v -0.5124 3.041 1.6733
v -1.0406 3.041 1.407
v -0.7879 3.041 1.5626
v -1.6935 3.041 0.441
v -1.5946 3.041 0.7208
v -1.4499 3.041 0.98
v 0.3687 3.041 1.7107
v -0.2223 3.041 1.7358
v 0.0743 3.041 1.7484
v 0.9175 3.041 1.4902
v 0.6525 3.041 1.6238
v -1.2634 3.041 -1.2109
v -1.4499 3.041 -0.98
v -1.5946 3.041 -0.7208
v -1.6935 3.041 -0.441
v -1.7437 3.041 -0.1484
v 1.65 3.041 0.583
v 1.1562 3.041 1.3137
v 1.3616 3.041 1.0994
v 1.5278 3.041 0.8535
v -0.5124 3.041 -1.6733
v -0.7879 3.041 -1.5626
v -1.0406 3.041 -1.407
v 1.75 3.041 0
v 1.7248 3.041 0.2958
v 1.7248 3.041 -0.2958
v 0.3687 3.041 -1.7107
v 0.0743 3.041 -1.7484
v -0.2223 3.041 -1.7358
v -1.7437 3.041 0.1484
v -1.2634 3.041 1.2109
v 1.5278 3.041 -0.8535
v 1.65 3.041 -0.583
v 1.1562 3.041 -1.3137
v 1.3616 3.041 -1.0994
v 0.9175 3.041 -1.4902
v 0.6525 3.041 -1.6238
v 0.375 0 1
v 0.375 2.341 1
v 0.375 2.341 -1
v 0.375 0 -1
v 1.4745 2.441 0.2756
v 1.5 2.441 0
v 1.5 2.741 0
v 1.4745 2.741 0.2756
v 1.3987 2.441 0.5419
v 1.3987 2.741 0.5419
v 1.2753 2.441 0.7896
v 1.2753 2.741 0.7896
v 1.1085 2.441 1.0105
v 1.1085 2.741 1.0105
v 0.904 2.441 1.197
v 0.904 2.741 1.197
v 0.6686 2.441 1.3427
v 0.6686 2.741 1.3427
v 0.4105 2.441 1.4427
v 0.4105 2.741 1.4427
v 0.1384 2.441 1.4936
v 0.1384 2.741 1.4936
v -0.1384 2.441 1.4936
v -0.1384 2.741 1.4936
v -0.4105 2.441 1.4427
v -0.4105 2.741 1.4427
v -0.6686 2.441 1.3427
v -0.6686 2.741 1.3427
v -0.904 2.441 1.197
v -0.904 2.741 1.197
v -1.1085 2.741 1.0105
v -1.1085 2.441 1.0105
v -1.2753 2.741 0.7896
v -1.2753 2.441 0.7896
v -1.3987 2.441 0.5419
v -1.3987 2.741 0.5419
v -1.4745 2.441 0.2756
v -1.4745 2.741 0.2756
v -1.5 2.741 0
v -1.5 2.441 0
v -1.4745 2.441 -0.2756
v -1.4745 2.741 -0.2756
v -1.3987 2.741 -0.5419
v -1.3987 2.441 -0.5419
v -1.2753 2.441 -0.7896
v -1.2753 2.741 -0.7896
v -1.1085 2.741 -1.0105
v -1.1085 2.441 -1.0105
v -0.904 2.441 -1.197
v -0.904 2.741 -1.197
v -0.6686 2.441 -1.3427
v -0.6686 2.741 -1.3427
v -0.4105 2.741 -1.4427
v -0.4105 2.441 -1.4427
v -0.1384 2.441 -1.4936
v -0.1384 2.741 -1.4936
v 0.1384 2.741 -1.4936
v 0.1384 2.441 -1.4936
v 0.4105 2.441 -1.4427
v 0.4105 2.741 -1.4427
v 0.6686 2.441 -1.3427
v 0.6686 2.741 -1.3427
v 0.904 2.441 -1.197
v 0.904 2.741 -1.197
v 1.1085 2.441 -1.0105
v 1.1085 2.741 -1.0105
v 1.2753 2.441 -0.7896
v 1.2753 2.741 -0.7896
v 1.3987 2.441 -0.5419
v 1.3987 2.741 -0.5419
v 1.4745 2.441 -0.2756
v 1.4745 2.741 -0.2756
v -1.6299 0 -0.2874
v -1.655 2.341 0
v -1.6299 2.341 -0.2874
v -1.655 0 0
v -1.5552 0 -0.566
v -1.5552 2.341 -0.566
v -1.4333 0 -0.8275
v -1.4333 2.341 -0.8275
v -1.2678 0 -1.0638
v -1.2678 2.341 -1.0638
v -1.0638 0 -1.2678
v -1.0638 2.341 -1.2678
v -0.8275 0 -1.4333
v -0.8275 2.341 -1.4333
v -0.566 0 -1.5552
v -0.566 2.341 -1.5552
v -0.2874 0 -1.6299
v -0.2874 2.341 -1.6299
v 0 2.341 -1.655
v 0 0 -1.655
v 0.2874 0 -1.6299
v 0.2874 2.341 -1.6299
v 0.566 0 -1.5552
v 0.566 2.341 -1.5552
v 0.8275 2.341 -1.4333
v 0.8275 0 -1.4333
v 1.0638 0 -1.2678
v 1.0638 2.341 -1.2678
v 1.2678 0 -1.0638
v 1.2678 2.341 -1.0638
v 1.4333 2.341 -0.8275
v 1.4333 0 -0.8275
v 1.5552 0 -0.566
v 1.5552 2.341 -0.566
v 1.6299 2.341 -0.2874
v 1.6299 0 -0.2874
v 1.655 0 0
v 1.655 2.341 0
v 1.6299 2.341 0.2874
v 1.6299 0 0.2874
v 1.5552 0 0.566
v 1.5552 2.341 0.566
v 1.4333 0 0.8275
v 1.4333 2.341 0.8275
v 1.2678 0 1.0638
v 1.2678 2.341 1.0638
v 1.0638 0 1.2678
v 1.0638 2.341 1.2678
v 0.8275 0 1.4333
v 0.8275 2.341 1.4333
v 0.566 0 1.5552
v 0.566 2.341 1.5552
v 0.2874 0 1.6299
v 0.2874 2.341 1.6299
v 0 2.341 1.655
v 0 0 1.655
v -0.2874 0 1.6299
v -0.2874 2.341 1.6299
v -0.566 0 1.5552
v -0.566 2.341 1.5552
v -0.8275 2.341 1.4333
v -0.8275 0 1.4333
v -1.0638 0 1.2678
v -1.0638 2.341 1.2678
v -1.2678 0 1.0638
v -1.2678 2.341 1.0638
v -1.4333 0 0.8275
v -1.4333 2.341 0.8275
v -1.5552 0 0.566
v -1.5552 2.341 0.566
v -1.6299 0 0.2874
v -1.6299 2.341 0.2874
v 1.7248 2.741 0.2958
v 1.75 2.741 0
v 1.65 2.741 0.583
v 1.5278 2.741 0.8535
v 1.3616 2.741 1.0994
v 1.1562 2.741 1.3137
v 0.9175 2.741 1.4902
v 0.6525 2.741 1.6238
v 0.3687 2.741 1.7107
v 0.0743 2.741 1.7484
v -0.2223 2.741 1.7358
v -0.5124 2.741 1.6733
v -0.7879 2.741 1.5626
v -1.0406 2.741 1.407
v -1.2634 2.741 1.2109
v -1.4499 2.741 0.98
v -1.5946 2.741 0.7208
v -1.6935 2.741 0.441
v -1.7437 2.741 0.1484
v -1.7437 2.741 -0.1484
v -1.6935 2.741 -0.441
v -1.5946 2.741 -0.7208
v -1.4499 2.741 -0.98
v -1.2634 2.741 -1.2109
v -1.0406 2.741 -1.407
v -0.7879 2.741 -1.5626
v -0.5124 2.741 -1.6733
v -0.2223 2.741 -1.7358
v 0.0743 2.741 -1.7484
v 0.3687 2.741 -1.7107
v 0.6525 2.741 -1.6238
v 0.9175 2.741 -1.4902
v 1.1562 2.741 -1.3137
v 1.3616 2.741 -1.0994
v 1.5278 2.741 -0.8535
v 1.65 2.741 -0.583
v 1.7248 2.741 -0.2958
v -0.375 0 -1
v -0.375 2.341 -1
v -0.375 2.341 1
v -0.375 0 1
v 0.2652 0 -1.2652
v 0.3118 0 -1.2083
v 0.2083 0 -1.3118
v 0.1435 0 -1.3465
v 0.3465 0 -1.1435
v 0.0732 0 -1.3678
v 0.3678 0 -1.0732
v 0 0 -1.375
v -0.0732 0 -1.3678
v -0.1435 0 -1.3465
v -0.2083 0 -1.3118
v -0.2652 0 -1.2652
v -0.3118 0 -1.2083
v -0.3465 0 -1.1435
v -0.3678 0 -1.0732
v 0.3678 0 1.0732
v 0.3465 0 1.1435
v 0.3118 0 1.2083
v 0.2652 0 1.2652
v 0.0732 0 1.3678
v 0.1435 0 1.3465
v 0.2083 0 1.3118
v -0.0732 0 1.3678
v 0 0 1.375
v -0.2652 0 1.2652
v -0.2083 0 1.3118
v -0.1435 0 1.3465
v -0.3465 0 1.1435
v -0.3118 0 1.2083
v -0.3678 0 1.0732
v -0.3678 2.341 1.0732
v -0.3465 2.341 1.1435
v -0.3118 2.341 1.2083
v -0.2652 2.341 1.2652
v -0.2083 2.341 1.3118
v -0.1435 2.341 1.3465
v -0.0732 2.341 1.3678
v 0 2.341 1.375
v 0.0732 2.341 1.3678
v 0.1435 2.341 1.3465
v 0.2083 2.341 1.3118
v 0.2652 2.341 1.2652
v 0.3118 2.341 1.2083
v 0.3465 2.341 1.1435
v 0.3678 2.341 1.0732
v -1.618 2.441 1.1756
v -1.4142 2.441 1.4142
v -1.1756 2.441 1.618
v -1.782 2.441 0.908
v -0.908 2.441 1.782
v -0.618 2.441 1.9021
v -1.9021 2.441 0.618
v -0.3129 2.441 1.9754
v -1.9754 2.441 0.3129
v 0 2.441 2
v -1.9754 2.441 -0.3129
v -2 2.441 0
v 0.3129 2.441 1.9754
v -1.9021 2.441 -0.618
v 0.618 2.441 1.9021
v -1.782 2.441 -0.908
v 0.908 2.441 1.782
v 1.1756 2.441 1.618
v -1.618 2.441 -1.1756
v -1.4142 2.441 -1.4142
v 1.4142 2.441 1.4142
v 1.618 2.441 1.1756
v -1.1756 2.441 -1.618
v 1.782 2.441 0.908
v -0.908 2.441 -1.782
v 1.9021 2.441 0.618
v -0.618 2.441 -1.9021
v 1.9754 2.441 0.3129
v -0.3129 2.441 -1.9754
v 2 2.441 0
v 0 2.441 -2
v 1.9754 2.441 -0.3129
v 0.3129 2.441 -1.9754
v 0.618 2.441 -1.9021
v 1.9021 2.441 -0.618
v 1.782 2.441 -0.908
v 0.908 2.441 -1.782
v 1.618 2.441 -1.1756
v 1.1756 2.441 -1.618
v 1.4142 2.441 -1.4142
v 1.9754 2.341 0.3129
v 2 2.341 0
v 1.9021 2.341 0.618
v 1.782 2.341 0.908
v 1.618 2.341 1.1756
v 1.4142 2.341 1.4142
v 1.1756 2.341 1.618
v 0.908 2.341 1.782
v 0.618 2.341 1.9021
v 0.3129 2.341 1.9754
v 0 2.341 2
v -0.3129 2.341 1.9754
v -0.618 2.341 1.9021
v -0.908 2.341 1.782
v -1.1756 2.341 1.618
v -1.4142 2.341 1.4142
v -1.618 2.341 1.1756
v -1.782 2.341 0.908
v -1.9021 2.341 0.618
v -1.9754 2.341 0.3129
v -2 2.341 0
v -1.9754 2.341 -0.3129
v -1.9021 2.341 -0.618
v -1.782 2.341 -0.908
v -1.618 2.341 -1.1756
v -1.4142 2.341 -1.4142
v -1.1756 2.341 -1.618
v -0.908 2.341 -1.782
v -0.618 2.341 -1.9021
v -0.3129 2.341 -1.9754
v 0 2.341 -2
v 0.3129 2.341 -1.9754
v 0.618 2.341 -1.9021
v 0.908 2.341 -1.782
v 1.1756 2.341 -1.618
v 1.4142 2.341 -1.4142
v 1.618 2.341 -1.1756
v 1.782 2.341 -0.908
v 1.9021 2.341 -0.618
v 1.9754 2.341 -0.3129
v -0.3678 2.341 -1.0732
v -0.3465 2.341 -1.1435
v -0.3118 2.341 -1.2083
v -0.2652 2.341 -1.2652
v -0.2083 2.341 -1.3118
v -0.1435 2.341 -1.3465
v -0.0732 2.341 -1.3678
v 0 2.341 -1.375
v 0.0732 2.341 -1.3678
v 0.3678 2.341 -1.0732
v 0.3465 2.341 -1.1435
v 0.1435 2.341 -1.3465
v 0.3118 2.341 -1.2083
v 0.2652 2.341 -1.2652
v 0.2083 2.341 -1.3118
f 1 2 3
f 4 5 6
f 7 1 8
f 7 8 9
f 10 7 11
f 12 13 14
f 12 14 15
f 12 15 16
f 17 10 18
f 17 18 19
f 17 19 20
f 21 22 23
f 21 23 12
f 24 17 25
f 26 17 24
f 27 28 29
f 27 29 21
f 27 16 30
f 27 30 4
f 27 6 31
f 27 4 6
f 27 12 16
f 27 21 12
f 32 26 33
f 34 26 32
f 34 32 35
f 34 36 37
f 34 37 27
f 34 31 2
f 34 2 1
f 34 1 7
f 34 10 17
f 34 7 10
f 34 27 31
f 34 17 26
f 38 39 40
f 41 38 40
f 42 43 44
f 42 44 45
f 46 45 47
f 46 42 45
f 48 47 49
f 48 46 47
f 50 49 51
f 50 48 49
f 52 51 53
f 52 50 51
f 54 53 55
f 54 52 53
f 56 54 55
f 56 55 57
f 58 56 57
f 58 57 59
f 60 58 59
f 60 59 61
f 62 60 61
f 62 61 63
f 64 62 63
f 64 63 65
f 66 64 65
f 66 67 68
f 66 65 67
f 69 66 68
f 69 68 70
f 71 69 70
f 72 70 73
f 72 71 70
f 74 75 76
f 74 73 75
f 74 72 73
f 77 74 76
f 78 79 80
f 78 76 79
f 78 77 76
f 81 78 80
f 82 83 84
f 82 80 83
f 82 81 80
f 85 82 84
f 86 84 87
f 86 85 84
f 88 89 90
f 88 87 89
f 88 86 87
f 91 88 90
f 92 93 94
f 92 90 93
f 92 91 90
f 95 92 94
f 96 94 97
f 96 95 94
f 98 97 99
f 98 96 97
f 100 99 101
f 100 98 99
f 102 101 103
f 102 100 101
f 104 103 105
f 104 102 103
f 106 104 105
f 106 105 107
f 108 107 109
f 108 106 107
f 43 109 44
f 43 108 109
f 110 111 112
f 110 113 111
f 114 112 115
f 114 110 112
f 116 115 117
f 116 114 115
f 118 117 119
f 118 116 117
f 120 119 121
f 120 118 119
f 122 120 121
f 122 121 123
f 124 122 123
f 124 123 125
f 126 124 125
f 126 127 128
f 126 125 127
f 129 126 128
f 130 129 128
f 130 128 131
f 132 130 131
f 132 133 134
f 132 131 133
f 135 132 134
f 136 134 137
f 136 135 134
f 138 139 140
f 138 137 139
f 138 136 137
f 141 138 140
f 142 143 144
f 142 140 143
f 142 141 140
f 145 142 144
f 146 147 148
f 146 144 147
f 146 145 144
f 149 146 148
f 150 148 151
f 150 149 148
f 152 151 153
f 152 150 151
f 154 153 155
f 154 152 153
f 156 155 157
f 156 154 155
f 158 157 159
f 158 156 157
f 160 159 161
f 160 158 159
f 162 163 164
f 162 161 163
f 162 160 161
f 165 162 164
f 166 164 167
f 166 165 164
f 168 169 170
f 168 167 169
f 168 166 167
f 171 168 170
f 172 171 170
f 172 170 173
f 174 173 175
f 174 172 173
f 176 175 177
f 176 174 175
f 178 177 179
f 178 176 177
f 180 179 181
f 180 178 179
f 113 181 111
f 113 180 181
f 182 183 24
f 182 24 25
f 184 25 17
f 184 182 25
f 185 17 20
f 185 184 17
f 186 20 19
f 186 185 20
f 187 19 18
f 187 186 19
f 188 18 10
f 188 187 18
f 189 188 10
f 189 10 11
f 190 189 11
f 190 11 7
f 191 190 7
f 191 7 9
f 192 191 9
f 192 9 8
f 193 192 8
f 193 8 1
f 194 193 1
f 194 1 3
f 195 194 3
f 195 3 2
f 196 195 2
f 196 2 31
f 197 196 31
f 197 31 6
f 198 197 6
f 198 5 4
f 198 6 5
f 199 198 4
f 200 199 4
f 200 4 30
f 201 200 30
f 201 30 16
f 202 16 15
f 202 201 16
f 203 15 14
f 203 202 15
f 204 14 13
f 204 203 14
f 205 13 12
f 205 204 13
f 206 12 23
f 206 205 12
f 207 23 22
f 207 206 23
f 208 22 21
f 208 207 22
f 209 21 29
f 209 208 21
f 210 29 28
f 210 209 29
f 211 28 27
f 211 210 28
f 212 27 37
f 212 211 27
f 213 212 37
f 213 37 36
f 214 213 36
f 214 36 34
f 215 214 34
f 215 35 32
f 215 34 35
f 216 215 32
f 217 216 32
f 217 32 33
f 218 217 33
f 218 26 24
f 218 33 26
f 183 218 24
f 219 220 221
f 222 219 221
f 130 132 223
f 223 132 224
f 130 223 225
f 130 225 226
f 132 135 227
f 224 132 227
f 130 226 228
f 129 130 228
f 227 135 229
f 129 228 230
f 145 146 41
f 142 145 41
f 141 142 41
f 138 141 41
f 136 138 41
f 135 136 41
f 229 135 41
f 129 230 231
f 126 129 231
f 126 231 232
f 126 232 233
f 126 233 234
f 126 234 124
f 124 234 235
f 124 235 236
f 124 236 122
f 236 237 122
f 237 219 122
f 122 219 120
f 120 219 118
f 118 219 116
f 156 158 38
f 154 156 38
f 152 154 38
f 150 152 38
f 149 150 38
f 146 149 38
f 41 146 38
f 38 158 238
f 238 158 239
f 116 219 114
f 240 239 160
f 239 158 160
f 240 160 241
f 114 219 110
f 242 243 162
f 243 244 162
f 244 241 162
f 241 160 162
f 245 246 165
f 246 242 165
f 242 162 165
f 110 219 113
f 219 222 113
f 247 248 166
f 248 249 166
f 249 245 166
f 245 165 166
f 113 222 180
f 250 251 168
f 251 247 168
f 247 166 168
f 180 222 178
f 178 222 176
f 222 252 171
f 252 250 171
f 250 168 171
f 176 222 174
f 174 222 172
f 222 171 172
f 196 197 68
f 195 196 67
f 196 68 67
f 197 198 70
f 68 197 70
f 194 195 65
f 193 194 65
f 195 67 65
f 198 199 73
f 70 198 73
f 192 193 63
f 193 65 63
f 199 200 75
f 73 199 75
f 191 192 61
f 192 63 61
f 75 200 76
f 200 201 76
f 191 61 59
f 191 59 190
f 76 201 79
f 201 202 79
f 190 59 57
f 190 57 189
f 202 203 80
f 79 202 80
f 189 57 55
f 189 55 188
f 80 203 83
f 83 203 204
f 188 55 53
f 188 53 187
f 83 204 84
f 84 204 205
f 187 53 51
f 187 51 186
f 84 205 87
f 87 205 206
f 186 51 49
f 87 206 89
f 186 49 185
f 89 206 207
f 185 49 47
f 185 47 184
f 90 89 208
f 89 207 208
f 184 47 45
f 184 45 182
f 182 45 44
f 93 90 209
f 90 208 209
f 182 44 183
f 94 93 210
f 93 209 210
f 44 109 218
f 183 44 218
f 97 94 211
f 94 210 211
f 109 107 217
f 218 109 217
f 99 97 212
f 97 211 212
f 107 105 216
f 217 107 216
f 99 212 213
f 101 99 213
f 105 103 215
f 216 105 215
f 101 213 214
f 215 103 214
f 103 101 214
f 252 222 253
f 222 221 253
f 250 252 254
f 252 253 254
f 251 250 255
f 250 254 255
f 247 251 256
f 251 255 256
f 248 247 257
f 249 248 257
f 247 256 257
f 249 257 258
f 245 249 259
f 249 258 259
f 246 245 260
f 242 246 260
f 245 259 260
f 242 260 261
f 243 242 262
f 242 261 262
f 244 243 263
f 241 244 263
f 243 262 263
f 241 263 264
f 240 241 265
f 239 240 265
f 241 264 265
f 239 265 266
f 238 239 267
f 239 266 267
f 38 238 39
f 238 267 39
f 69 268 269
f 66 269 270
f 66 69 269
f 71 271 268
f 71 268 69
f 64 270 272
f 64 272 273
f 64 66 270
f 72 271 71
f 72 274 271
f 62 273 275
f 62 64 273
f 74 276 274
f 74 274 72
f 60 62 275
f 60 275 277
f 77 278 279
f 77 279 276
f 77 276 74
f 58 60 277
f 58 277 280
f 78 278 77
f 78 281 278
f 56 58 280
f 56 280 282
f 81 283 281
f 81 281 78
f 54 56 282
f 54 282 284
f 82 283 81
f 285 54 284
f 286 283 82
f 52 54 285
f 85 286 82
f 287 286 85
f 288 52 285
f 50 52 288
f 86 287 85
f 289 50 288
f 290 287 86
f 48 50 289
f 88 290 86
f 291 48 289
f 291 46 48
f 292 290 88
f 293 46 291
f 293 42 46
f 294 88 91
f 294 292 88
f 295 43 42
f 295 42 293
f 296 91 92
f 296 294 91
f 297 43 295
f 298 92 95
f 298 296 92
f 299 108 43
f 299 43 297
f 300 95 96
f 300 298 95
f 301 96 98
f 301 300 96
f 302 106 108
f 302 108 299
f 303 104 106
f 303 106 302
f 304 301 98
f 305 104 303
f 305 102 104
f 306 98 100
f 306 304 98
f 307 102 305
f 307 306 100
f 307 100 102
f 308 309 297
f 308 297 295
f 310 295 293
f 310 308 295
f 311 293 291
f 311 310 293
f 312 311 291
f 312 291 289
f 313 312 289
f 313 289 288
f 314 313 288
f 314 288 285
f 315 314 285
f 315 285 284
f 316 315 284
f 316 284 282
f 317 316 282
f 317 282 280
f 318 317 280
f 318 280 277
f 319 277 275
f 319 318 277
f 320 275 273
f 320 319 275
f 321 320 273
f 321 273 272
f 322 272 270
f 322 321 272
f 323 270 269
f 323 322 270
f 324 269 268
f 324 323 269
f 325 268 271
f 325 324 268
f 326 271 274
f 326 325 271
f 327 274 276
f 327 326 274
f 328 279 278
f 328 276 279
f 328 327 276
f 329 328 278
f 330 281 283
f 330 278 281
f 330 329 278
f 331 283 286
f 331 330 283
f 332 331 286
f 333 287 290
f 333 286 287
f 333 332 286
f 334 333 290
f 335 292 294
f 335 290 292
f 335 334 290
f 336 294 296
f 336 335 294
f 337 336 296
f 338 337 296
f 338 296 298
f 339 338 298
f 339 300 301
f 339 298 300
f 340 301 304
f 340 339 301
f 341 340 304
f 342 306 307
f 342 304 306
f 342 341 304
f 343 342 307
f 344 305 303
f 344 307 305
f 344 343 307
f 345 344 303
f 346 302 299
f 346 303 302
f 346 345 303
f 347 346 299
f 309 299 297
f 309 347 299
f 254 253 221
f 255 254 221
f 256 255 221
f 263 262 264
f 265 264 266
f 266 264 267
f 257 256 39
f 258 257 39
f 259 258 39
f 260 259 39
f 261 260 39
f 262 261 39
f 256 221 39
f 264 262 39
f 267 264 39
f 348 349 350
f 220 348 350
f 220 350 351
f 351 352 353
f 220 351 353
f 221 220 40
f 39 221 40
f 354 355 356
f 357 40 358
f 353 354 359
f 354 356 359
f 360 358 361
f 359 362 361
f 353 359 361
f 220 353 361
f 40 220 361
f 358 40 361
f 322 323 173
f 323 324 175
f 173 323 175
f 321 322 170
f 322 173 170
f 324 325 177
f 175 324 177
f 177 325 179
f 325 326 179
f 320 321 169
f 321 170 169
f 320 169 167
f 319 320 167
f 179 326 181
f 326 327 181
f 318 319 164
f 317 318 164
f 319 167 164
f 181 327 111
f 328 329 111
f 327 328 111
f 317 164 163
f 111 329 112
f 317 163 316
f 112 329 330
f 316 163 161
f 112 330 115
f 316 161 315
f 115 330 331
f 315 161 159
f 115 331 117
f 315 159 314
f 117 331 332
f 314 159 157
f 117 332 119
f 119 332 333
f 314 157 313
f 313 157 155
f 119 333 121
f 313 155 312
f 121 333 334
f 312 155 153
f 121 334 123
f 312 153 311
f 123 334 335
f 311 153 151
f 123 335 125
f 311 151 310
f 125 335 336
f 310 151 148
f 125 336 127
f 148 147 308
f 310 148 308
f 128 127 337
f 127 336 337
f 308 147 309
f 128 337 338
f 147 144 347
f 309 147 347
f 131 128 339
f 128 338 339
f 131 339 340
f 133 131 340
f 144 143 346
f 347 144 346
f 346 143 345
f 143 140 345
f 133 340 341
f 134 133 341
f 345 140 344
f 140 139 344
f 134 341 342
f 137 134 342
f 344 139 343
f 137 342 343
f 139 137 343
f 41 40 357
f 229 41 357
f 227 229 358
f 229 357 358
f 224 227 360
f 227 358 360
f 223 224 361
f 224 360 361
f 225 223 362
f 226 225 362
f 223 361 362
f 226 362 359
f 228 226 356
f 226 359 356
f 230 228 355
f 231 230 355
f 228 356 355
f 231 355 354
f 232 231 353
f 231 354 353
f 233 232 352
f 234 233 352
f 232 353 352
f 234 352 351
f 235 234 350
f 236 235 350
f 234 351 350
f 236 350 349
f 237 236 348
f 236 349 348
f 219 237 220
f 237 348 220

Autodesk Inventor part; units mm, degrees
ref_plane "YZ Plane" through (0, 0, 0) normal (1, 0, 0) x (0, 1, 0)
ref_plane "XZ Plane" through (0, 0, 0) normal (0, 1, 0) x (-1, 0, 0)
ref_plane "XY Plane" through (0, 0, 0) normal (0, 0, 1) x (1, 0, 0)
sketch "Sketch1" plane through (0, 0, 0) normal (0, 1, 0) x (-1, 0, 0)
  circle A0 centre (0, 0) radius 1.655
  dimension "d0" = 3.31
extrude "Extrusion1" add sketch "Sketch1" along normal blind 2.341
sketch "Sketch2" plane through (0, 2.341, 0) normal (0, 1, 0) x (1, 0, 0)
  line L0 (0, -1) -> (0, 1) construction
  line L1 (0.375, -1) -> (0.375, 1)
  line L2 (-0.375, 1) -> (-0.375, -1)
  arc A0 (-0.375, -1) -> (0.375, -1) centre (0, -1) ccw
  arc A1 (0.375, 1) -> (-0.375, 1) centre (0, 1) ccw
  point P0 (0, 0)
  dimension "d3" = 1
  dimension "d4" = 0.75
extrude "Extrusion2" cut sketch "Sketch2" against normal through all
sketch "Sketch3" plane through (0, 2.341, 0) normal (0, 1, 0) x (1, 0, 0)
  circle A0 centre (0, 0) radius 2
  dimension "d7" = 4
extrude "Extrusion3" add sketch "Sketch3" along normal blind 0.1
sketch "Sketch4" plane through (0, 2.441, 0) normal (0, 1, 0) x (1, 0, 0)
  circle A0 centre (0, 0) radius 1.5
  dimension "d10" = 3
extrude "Extrusion4" add sketch "Sketch4" along normal blind 0.3
sketch "Sketch5" plane through (0, 2.741, 0) normal (0, 1, 0) x (1, 0, 0)
  circle A0 centre (0, 0) radius 1.75
  dimension "d13" = 3.5
extrude "Extrusion5" add sketch "Sketch5" along normal blind 0.3
properties part number "Pin Hole Lock2"
